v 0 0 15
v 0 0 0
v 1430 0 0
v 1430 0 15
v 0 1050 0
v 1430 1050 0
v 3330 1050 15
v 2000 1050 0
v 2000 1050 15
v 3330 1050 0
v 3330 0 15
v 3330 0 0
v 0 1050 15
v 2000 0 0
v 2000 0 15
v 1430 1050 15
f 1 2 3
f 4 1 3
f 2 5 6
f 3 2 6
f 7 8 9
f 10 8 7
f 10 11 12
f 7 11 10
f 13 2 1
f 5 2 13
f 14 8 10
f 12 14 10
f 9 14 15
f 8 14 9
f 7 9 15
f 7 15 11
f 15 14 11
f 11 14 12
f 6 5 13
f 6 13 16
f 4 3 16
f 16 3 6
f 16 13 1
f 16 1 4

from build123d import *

# Parameters (mm, degrees)
F0_W     = 1430
F0_H     = 1050
F1_DEPTH = 15
F3_W     = 300
F3_H     = 300
F3_W_2   = 100
F3_H_2   = 1050
F4_DEPTH = 15.001


with BuildPart() as f1:
    # F0 (on Top) → F1 (new body)
    with BuildSketch(Plane.XY):
        with Locations((715, 525)):
            Rectangle(F0_W, F0_H)
    extrude(amount=F1_DEPTH)


with BuildPart() as f2_1:
    # F2: copy of F1
    add(f1.part.moved(Location((2000, 0, 0))))

    # F3 (on face) → F4 (cut, through all)
    with BuildSketch(Plane.XY.offset(15)):
        with Locations((3650, 525)):
            Rectangle(F3_W, F3_H)
        with Locations((3380, 525)):
            Rectangle(F3_W_2, F3_H_2)
    extrude(amount=-F4_DEPTH, mode=Mode.SUBTRACT)


solid = Compound([f1.part, f2_1.part])
